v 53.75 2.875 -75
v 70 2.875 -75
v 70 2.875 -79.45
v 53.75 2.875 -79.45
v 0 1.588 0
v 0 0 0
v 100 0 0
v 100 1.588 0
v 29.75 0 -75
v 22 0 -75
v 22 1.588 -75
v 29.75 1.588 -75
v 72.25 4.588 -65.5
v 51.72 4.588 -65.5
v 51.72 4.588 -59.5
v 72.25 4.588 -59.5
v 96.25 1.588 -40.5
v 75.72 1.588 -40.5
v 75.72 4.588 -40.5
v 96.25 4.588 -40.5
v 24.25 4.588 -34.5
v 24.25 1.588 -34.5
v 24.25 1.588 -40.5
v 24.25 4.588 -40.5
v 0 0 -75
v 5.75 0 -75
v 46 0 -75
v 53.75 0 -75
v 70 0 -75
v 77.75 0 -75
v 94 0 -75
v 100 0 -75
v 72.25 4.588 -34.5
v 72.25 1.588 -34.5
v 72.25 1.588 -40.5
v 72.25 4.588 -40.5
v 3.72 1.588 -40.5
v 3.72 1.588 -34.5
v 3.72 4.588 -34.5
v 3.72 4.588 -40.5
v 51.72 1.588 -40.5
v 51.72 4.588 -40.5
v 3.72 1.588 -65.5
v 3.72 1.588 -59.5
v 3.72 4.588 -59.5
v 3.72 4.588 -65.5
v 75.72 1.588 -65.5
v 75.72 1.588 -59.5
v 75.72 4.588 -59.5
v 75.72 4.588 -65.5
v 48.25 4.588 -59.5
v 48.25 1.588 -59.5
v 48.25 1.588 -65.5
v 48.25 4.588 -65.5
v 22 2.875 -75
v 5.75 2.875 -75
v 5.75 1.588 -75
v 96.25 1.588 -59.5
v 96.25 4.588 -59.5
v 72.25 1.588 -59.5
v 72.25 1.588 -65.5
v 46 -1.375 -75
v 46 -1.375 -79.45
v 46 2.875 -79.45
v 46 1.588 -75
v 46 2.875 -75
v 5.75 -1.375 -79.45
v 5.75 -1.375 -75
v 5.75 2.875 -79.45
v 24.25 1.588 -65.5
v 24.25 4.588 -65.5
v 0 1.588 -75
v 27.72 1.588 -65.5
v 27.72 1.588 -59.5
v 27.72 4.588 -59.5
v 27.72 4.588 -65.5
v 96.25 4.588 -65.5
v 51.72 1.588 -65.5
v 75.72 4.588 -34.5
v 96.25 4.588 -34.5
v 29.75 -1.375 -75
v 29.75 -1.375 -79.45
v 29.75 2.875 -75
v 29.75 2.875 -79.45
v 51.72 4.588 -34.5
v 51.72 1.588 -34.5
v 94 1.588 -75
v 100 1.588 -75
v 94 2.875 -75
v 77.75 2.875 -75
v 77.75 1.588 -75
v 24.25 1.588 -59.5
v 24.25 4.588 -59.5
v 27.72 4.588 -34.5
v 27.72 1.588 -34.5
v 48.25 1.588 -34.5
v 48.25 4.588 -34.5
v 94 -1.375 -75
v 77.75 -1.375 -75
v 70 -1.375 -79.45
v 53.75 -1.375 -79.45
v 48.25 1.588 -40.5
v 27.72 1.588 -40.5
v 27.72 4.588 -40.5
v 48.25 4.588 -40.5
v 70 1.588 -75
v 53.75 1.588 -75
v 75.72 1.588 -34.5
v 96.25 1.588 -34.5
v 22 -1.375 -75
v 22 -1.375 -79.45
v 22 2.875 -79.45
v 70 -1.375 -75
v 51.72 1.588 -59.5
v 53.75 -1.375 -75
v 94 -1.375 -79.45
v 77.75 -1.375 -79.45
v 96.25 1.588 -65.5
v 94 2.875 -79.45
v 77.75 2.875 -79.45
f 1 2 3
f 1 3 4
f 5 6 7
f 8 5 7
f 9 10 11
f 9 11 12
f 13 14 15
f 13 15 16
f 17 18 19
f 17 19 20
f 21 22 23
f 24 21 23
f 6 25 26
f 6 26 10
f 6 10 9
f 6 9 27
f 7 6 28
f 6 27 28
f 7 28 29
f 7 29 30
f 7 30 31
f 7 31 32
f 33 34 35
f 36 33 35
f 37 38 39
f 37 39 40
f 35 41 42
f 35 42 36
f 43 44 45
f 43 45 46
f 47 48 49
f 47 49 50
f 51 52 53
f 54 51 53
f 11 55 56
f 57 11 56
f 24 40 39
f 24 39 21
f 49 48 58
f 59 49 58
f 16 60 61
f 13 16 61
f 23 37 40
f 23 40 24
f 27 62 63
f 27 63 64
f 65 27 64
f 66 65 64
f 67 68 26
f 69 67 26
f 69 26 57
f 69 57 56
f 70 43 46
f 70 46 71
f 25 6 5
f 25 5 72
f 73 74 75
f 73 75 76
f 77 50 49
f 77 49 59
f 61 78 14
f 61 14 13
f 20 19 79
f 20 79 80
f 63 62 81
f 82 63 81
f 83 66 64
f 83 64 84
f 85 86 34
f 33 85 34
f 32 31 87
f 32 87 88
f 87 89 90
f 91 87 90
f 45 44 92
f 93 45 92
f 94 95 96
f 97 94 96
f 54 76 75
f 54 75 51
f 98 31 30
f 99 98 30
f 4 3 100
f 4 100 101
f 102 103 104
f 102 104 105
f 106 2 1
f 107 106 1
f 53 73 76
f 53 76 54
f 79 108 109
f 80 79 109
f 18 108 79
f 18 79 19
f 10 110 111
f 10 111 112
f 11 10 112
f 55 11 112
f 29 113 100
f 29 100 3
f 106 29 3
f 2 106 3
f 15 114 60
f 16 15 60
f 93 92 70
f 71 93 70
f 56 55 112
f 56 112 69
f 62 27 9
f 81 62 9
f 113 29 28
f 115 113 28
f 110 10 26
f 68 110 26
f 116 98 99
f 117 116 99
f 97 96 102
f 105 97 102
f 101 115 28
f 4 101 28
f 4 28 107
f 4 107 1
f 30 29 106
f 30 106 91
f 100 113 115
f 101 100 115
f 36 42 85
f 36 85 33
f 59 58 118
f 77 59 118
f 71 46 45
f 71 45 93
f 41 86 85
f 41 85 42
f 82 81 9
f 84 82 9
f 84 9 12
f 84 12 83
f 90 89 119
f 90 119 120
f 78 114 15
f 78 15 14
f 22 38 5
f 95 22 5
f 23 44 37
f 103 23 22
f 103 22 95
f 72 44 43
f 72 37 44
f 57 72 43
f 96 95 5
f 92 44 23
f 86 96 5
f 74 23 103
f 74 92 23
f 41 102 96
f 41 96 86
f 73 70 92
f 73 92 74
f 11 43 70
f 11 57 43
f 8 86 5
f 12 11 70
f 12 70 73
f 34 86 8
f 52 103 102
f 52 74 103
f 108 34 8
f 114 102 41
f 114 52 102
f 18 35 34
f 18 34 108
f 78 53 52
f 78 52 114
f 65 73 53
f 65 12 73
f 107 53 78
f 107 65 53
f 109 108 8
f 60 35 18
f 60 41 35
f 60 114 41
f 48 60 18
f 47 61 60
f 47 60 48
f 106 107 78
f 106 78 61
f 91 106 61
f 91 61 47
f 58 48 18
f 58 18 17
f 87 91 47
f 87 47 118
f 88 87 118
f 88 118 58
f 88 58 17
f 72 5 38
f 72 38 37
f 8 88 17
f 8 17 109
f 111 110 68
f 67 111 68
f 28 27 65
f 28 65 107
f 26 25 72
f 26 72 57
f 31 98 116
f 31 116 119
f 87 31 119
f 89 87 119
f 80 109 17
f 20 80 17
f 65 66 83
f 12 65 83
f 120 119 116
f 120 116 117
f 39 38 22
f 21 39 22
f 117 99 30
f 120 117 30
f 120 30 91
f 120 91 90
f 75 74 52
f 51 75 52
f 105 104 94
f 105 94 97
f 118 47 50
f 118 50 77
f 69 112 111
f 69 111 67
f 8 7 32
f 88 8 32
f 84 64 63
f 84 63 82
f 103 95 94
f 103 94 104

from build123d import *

# Parameters (mm, degrees)
SKETCH1_W            = 100
SKETCH1_H            = 75
BOSS_EXTRUDE1_DEPTH  = 1.5875
SKETCH2_W            = 20.53
SKETCH2_H            = 6
BOSS_EXTRUDE2_DEPTH  = 4.5875
LPATTERN1_COUNT      = 4
LPATTERN1_PITCH      = 24
LPATTERN1_COUNT_DIR2 = 2
LPATTERN1_PITCH_DIR2 = 25
SKETCH3_W            = 16.25
SKETCH3_H            = 4.25
BOSS_EXTRUDE3_DEPTH  = 4.45
LPATTERN2_COUNT      = 4
LPATTERN2_PITCH      = 24


with BuildPart() as part:
    # Sketch1 → Boss-Extrude1 (new body)
    with BuildSketch(Plane(origin=(0, 0, 0), x_dir=(1, 0, 0), z_dir=(0, 1, 0))):
        with Locations((50, 37.5)):
            Rectangle(SKETCH1_W, SKETCH1_H)
    extrude(amount=BOSS_EXTRUDE1_DEPTH)

    # Sketch2 → Boss-Extrude2 (add)
    with BuildSketch(Plane(origin=(0, 0, 0), x_dir=(1, 0, 0), z_dir=(0, 1, 0))):
        with Locations((13.985, 37.5)):
            Rectangle(SKETCH2_W, SKETCH2_H)
    boss_extrude2 = extrude(amount=BOSS_EXTRUDE2_DEPTH)

    # LPattern1: Boss-Extrude2 4 × 2
    with Locations(*[(i * LPATTERN1_PITCH, 0, -j * LPATTERN1_PITCH_DIR2) for i in range(LPATTERN1_COUNT) for j in range(LPATTERN1_COUNT_DIR2) if (i, j) != (0, 0)]):
        add(boss_extrude2)

    # Sketch3 → Boss-Extrude3 (add)
    with BuildSketch(Plane(origin=(0, 0, -75), x_dir=(-1, 0, 0), z_dir=(0, 0, -1))):
        with Locations((-13.875, 0.75)):
            Rectangle(SKETCH3_W, SKETCH3_H)
    boss_extrude3 = extrude(amount=BOSS_EXTRUDE3_DEPTH)

    # LPattern2: Boss-Extrude3 ×4
    with Locations(*[(i * LPATTERN2_PITCH, 0, 0) for i in range(1, LPATTERN2_COUNT)]):
        add(boss_extrude3)


solid = part.part
